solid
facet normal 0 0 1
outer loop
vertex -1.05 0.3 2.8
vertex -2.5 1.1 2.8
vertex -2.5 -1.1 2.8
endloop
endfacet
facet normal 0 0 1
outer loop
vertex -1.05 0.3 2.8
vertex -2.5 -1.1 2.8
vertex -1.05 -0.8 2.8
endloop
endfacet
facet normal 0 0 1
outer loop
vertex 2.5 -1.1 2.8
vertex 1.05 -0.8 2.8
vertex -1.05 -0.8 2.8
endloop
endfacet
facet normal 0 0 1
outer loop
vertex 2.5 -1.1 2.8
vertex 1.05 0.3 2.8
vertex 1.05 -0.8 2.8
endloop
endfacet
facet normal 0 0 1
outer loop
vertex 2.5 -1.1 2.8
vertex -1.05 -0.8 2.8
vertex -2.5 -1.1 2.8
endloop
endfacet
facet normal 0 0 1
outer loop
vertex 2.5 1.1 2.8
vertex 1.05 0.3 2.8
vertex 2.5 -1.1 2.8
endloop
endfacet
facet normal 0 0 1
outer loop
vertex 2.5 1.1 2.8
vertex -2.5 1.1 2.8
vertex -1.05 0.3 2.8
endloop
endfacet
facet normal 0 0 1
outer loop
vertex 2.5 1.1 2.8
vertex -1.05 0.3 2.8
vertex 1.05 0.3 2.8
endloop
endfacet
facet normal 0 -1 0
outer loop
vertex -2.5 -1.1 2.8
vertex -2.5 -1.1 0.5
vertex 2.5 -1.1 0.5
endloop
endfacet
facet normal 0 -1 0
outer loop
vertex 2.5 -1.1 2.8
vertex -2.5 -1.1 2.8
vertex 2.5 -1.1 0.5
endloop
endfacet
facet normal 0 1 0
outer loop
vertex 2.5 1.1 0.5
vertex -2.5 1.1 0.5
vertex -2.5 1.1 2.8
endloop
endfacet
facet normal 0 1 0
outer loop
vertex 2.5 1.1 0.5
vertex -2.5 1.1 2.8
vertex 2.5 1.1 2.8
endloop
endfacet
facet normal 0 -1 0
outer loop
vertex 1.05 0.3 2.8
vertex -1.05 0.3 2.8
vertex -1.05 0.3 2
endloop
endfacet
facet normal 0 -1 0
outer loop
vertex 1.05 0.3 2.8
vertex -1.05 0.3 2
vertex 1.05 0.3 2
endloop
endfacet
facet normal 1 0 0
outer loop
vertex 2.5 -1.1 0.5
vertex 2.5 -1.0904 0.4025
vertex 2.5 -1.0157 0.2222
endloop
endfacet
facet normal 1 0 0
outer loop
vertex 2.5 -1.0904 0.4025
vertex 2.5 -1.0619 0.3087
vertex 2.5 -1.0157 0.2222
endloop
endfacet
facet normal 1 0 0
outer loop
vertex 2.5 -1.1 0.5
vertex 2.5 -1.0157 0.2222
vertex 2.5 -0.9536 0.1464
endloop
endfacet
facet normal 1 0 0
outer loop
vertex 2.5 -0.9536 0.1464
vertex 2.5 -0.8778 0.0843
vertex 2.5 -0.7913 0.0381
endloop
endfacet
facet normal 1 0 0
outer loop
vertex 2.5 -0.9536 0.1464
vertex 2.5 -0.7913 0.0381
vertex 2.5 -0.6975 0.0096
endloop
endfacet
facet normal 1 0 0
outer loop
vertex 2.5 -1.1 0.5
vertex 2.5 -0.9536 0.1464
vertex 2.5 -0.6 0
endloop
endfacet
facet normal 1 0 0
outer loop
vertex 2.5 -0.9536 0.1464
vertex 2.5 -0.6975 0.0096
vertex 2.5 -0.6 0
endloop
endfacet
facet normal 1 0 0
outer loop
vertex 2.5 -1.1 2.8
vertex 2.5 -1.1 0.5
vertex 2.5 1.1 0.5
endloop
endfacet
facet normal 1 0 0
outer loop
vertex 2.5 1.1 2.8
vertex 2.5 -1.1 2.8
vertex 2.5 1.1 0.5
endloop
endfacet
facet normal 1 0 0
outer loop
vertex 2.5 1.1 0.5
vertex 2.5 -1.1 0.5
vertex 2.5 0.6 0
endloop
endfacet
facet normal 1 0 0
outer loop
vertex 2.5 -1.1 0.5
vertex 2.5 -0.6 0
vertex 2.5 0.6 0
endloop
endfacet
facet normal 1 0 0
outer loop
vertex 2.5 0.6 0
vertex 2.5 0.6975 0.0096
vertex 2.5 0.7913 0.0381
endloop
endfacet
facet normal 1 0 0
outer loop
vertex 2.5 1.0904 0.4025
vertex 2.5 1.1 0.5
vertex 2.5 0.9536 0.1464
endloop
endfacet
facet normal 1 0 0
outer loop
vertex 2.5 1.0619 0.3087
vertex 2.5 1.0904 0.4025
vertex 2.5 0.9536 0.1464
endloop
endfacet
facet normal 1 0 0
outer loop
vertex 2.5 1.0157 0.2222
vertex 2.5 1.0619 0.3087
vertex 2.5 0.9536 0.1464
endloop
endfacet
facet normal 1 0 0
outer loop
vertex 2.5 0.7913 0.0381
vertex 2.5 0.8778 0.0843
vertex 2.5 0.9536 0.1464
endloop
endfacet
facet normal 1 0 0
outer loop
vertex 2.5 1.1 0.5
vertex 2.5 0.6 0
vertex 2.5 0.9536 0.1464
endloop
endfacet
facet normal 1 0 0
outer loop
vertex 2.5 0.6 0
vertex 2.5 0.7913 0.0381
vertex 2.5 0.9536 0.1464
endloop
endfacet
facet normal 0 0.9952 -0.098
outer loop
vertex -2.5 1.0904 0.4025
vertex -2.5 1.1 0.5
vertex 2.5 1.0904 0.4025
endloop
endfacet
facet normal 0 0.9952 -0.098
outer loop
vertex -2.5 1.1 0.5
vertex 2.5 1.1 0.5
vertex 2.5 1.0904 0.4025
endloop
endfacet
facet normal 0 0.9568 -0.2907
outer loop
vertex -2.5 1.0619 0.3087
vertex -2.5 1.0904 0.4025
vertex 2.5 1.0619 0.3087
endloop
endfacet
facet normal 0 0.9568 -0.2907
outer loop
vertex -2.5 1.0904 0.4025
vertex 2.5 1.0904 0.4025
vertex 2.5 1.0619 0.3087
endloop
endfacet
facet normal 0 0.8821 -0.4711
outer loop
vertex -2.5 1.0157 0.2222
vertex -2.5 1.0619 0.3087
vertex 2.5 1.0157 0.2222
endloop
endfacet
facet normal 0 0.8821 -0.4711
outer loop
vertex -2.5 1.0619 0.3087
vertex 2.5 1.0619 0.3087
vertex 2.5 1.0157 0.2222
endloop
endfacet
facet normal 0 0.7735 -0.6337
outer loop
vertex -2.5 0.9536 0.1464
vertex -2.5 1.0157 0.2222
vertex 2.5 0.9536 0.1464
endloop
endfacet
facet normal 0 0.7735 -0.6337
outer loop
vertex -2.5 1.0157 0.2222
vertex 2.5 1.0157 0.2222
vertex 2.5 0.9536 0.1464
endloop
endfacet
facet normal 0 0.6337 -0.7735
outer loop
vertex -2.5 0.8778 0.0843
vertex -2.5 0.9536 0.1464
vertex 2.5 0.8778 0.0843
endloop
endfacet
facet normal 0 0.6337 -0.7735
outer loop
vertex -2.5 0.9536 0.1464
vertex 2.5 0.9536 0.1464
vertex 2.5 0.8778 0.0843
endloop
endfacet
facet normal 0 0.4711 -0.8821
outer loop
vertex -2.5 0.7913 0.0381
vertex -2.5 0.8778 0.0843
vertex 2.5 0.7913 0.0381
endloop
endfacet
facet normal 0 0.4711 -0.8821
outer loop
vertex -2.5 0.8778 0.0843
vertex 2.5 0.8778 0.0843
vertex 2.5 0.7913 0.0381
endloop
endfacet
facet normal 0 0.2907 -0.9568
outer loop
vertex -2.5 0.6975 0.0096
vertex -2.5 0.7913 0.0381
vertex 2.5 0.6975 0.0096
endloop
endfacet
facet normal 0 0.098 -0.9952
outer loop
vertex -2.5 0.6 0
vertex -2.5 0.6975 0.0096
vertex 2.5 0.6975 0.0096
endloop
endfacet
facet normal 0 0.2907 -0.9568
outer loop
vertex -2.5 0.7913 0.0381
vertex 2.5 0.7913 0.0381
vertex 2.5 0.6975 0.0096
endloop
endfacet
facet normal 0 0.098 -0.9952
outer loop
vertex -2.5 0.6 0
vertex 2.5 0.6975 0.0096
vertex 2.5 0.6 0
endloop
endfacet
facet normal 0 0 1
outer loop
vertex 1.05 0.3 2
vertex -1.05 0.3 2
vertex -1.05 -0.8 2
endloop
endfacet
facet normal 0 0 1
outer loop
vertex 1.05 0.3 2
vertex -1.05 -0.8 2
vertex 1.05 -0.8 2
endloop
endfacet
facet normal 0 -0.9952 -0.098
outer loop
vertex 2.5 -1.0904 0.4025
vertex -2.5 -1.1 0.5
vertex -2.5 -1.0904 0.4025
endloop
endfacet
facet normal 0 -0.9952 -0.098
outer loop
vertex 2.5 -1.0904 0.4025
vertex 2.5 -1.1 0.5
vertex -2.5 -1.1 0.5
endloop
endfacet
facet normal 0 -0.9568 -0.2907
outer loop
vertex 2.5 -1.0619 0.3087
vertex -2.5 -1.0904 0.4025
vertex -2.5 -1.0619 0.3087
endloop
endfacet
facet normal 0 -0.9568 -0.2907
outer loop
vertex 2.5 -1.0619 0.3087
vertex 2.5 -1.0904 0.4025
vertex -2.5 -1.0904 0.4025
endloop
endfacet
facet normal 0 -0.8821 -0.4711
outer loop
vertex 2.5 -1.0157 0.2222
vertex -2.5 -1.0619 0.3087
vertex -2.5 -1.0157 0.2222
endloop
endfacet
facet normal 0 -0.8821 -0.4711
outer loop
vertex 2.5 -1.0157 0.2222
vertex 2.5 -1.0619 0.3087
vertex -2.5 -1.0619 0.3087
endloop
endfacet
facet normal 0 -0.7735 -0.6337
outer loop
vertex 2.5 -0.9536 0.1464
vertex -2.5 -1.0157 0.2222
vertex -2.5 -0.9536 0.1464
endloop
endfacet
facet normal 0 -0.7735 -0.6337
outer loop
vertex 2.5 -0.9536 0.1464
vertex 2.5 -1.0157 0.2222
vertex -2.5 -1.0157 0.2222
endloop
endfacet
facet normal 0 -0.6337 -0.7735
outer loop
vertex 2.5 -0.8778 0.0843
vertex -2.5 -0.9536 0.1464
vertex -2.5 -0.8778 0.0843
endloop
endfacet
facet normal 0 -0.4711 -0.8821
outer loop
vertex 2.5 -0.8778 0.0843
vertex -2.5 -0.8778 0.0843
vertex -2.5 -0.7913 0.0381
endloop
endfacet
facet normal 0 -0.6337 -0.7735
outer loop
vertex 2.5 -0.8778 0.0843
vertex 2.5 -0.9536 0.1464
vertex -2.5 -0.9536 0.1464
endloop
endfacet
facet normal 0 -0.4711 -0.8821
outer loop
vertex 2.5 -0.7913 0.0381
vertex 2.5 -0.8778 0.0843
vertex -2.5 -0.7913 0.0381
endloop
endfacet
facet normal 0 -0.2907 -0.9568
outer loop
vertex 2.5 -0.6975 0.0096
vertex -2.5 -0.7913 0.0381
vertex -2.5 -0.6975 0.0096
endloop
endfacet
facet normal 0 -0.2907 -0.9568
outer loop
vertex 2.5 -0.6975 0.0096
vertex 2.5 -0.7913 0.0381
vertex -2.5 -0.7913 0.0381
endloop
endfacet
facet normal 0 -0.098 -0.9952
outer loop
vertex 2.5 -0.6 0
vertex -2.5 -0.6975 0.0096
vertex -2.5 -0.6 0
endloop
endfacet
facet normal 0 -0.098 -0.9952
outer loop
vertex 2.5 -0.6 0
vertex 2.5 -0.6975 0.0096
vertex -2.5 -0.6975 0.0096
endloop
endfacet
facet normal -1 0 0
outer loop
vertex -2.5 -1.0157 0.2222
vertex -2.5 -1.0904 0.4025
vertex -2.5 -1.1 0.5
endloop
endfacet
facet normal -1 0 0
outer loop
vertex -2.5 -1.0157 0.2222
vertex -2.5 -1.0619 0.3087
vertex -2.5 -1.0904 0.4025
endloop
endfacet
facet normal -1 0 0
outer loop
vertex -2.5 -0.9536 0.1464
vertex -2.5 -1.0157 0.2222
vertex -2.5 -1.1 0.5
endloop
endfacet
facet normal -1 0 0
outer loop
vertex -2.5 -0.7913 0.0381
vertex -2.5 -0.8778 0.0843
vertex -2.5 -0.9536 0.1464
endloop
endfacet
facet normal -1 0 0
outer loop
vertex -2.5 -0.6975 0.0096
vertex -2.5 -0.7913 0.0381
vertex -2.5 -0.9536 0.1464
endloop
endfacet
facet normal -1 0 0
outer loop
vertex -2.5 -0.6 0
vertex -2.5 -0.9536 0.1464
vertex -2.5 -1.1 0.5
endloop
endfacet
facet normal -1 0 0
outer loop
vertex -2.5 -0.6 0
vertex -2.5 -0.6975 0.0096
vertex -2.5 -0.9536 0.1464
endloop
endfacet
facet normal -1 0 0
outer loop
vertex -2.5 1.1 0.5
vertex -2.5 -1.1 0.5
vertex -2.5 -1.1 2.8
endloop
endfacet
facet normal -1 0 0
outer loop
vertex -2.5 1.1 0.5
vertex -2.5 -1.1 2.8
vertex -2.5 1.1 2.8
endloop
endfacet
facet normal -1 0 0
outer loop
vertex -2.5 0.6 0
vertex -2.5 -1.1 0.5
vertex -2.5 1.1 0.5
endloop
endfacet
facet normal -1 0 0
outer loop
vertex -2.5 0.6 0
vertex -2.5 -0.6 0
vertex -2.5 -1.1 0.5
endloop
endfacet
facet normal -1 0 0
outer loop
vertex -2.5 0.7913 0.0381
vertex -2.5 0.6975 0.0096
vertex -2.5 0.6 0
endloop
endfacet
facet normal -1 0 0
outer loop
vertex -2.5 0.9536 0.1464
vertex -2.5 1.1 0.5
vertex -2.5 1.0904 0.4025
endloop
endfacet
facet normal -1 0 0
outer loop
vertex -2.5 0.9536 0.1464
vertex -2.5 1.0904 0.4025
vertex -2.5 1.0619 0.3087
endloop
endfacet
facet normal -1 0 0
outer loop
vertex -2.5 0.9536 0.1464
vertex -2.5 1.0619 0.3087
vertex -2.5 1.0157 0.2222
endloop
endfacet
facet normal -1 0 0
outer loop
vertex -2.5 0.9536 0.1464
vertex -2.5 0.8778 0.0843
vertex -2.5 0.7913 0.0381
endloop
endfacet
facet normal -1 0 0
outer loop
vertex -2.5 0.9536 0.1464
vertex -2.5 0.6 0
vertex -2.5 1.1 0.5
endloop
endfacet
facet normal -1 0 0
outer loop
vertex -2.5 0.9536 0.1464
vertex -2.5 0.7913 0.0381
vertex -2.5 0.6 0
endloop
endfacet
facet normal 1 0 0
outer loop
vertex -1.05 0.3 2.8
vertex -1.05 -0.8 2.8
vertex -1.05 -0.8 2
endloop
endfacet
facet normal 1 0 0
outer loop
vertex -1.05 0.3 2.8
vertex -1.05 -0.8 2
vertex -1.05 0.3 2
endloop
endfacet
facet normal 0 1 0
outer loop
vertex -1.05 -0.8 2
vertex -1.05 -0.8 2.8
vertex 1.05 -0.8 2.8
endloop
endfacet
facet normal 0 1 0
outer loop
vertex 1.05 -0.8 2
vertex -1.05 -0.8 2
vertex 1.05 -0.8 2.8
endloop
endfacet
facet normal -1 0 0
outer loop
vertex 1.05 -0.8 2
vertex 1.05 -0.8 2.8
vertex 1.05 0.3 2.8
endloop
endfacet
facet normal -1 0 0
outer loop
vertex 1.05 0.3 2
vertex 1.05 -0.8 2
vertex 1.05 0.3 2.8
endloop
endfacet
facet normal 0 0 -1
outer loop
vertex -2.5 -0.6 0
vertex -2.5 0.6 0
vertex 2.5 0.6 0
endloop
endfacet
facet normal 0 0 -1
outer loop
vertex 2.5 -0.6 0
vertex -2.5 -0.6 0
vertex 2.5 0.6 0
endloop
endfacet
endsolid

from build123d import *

# Parameters (mm, degrees)
SKETCH_1_W          = 5
SKETCH_1_H          = 2.2
EXTRUDE_1_DEPTH     = 2.8
SKETCH_2_W          = 2.1
SKETCH_2_H          = 1.1
CUT_EXTRUDE_1_DEPTH = 0.8
FILLET_1_R          = 0.5


with BuildPart() as part:
    # 草图1 → 凸台-拉伸1 (new body)
    with BuildSketch(Plane.XY):
        Rectangle(SKETCH_1_W, SKETCH_1_H)
    extrude(amount=EXTRUDE_1_DEPTH)

    # 草图2 → 切除-拉伸1 (cut)
    with BuildSketch(Plane.XY.offset(2.8)):
        with Locations((0, -0.25)):
            Rectangle(SKETCH_2_W, SKETCH_2_H)
    extrude(amount=-CUT_EXTRUDE_1_DEPTH, mode=Mode.SUBTRACT)

    # 圆角1
    fillet_1_edges = [part.edges().sort_by_distance(p)[0] for p in [
        (0, -1.1, 0),
        (0, 1.1, 0),
    ]]
    fillet(fillet_1_edges, radius=FILLET_1_R)


solid = part.part
